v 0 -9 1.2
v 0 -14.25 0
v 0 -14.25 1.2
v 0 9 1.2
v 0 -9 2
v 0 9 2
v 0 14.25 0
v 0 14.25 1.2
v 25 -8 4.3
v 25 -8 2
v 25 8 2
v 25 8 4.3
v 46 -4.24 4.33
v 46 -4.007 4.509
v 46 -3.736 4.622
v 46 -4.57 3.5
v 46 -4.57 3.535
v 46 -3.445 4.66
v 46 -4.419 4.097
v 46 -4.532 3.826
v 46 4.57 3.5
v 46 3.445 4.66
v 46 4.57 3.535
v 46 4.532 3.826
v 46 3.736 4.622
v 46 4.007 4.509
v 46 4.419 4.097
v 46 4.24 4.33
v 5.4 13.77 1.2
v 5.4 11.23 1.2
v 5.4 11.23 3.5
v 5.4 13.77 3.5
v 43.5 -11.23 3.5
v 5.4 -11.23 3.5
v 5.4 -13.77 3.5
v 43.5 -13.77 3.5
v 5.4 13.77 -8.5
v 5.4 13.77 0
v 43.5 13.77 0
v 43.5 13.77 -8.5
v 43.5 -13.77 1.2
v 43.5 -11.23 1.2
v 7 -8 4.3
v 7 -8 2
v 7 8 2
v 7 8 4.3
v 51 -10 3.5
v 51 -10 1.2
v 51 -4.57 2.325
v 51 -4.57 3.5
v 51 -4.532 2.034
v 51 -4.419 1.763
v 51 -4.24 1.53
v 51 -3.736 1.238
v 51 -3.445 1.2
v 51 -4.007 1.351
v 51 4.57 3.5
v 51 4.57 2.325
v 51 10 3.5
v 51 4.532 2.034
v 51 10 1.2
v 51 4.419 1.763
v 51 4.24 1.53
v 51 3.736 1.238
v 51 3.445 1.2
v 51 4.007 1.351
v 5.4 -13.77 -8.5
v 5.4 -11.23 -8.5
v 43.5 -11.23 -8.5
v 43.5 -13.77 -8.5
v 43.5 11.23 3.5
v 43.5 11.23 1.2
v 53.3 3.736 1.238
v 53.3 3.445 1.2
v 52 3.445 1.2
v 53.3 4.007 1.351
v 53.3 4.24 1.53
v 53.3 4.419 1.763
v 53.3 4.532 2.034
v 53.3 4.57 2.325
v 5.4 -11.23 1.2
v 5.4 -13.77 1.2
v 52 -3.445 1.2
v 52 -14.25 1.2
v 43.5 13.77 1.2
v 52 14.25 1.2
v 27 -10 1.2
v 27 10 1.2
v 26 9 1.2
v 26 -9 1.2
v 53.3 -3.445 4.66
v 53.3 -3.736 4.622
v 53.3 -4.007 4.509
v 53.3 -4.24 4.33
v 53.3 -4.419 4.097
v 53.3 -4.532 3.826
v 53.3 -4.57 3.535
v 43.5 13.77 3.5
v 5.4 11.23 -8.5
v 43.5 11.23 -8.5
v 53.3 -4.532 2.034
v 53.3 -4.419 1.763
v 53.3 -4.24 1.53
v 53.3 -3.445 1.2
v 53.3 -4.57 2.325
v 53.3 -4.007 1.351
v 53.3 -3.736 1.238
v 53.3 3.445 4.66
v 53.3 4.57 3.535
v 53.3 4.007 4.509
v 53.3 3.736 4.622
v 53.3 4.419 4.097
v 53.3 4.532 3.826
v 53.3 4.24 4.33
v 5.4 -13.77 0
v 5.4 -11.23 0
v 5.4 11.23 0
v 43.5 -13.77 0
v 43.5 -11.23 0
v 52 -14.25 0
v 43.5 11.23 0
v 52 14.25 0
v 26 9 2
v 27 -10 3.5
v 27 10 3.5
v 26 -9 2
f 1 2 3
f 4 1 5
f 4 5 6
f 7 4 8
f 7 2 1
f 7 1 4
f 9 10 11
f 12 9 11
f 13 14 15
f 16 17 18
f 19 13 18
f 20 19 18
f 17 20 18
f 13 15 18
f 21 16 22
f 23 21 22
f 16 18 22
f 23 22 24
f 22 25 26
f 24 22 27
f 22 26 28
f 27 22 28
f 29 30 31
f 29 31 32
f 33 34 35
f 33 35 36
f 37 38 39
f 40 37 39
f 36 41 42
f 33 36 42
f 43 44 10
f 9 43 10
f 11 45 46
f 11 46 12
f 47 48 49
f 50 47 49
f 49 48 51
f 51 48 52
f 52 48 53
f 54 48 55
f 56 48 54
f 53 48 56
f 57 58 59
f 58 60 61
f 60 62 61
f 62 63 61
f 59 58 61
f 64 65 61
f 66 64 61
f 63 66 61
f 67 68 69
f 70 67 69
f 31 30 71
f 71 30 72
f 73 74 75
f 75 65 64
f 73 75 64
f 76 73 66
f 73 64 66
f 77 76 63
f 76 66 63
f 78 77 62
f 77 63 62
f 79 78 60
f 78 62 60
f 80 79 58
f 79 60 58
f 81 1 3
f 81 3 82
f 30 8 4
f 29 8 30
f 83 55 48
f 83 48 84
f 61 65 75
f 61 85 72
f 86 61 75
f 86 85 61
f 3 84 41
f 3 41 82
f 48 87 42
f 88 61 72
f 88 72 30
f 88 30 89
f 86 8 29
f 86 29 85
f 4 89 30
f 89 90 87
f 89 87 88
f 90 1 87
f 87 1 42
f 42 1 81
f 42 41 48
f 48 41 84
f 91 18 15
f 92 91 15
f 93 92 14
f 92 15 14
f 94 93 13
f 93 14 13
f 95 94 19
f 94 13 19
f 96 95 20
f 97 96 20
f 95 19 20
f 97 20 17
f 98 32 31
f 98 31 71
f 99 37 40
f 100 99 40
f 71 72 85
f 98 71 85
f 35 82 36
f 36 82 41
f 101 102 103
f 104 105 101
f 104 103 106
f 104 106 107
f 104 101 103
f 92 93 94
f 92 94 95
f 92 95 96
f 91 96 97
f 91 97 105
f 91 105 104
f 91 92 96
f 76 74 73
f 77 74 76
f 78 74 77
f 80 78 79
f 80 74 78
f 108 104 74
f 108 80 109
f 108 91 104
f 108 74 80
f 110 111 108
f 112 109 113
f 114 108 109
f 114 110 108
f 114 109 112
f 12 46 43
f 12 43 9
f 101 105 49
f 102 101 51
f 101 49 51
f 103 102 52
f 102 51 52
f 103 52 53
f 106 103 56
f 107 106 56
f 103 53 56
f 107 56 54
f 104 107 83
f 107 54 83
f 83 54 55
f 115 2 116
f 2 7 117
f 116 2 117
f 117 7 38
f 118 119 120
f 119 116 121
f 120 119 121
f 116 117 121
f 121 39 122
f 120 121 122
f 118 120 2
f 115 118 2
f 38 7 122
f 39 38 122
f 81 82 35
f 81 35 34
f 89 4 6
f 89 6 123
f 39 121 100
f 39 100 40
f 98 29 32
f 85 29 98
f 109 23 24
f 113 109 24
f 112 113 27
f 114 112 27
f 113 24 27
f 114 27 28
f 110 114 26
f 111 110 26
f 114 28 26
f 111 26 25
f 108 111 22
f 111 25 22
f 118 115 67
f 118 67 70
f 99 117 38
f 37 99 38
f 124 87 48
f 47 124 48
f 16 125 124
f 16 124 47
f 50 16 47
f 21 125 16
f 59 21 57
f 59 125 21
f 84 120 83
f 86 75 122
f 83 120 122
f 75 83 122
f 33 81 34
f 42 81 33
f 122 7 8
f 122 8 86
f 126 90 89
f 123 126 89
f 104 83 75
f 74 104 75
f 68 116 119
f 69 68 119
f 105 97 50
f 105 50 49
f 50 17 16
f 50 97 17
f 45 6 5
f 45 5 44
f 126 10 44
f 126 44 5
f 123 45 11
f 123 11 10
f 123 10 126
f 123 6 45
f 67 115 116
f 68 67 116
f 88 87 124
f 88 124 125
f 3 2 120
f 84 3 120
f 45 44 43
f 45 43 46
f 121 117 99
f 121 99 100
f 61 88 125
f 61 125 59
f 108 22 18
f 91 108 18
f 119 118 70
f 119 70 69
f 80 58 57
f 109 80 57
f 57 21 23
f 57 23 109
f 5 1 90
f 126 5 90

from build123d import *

# Parameters (mm, degrees)
SKETCH016_W       = 52
SKETCH016_H       = 28.5
PAD001_DEPTH      = 1.2
SKETCH017_W       = 26
SKETCH017_H       = 18
PAD003_DEPTH      = 2
SKETCH018_W       = 18
SKETCH018_H       = 16
PAD029_DEPTH      = 4.3
PAD030_DEPTH      = 7.3
SKETCH019_W       = 24
SKETCH019_H       = 20
PAD006_DEPTH      = 3.5
SKETCH020_W       = 38.1
SKETCH020_H       = 2.54
PAD031_DEPTH      = 8.5
PAD031_DEPTH_BACK = 3.5
SKETCH021_W       = 0.64
SKETCH021_H       = 0.64
PAD032_DEPTH      = 8.5


with BuildPart() as part:
    # Sketch016 → Pad001 (new body)
    with BuildSketch(Plane.XY):
        with Locations((26, 0)):
            Rectangle(SKETCH016_W, SKETCH016_H)
    extrude(amount=PAD001_DEPTH)

    # Sketch017 → Pad003 (join)
    with BuildSketch(Plane.XY):
        with Locations((13, 0)):
            Rectangle(SKETCH017_W, SKETCH017_H)
    extrude(amount=PAD003_DEPTH)

    # Sketch018 → Pad029 (join)
    with BuildSketch(Plane.XY):
        with Locations((16, 0)):
            Rectangle(SKETCH018_W, SKETCH018_H)
    extrude(amount=PAD029_DEPTH)

    # Sketch004 → Pad030 (join)
    with BuildSketch(Plane.YZ.offset(46)):
        with BuildLine():
            Line((-3.445, 1.2), (3.445, 1.2))
            ThreePointArc((3.445, 1.2), (4.240495, 1.529505), (4.57, 2.325))
            Line((4.57, 2.325), (4.57, 3.535))
            ThreePointArc((4.57, 3.535), (4.240495, 4.330495), (3.445, 4.66))
            Line((3.445, 4.66), (-3.445, 4.66))
            ThreePointArc((-3.445, 4.66), (-4.240495, 4.330495), (-4.57, 3.535))
            Line((-4.57, 3.535), (-4.57, 2.325))
            ThreePointArc((-4.57, 2.325), (-4.240495, 1.529505), (-3.445, 1.2))
        make_face()
    extrude(amount=PAD030_DEPTH)

    # Sketch019 → Pad006 (join)
    with BuildSketch(Plane.XY):
        with Locations((39, 0)):
            Rectangle(SKETCH019_W, SKETCH019_H)
    extrude(amount=PAD006_DEPTH)

    # Sketch020 → Pad031 (join, two sides)
    with BuildSketch(Plane.XY) as pad031_sk:
        with Locations((24.45, 12.5)):
            Rectangle(SKETCH020_W, SKETCH020_H)
        with Locations((24.45, -12.5)):
            Rectangle(SKETCH020_W, SKETCH020_H)
    extrude(amount=-PAD031_DEPTH)
    extrude(pad031_sk.sketch, amount=PAD031_DEPTH_BACK)

    # Sketch021 → Pad032 (join)
    with BuildSketch(Plane.XY):
        with Locations((6.82, 12.5)):
            Rectangle(SKETCH021_W, SKETCH021_H)
        with Locations((6.82, -12.5)):
            Rectangle(SKETCH021_W, SKETCH021_H)
        with Locations((9.36, 12.5)):
            Rectangle(SKETCH021_W, SKETCH021_H)
        with Locations((9.36, -12.5)):
            Rectangle(SKETCH021_W, SKETCH021_H)
        with Locations((11.9, 12.5)):
            Rectangle(SKETCH021_W, SKETCH021_H)
        with Locations((11.9, -12.5)):
            Rectangle(SKETCH021_W, SKETCH021_H)
        with Locations((14.44, 12.5)):
            Rectangle(SKETCH021_W, SKETCH021_H)
        with Locations((14.44, -12.5)):
            Rectangle(SKETCH021_W, SKETCH021_H)
        with Locations((16.98, 12.5)):
            Rectangle(SKETCH021_W, SKETCH021_H)
        with Locations((16.98, -12.5)):
            Rectangle(SKETCH021_W, SKETCH021_H)
        with Locations((19.52, 12.5)):
            Rectangle(SKETCH021_W, SKETCH021_H)
        with Locations((19.52, -12.5)):
            Rectangle(SKETCH021_W, SKETCH021_H)
        with Locations((22.06, 12.5)):
            Rectangle(SKETCH021_W, SKETCH021_H)
        with Locations((22.06, -12.5)):
            Rectangle(SKETCH021_W, SKETCH021_H)
        with Locations((24.6, 12.5)):
            Rectangle(SKETCH021_W, SKETCH021_H)
        with Locations((24.6, -12.5)):
            Rectangle(SKETCH021_W, SKETCH021_H)
        with Locations((27.14, 12.5)):
            Rectangle(SKETCH021_W, SKETCH021_H)
        with Locations((27.14, -12.5)):
            Rectangle(SKETCH021_W, SKETCH021_H)
        with Locations((29.68, 12.5)):
            Rectangle(SKETCH021_W, SKETCH021_H)
        with Locations((29.68, -12.5)):
            Rectangle(SKETCH021_W, SKETCH021_H)
        with Locations((32.22, 12.5)):
            Rectangle(SKETCH021_W, SKETCH021_H)
        with Locations((32.22, -12.5)):
            Rectangle(SKETCH021_W, SKETCH021_H)
        with Locations((34.76, 12.5)):
            Rectangle(SKETCH021_W, SKETCH021_H)
        with Locations((34.76, -12.5)):
            Rectangle(SKETCH021_W, SKETCH021_H)
        with Locations((37.3, 12.5)):
            Rectangle(SKETCH021_W, SKETCH021_H)
        with Locations((37.3, -12.5)):
            Rectangle(SKETCH021_W, SKETCH021_H)
        with Locations((39.84, 12.5)):
            Rectangle(SKETCH021_W, SKETCH021_H)
        with Locations((39.84, -12.5)):
            Rectangle(SKETCH021_W, SKETCH021_H)
        with Locations((42.38, 12.5)):
            Rectangle(SKETCH021_W, SKETCH021_H)
        with Locations((42.38, -12.5)):
            Rectangle(SKETCH021_W, SKETCH021_H)
    extrude(amount=-PAD032_DEPTH)


solid = part.part
